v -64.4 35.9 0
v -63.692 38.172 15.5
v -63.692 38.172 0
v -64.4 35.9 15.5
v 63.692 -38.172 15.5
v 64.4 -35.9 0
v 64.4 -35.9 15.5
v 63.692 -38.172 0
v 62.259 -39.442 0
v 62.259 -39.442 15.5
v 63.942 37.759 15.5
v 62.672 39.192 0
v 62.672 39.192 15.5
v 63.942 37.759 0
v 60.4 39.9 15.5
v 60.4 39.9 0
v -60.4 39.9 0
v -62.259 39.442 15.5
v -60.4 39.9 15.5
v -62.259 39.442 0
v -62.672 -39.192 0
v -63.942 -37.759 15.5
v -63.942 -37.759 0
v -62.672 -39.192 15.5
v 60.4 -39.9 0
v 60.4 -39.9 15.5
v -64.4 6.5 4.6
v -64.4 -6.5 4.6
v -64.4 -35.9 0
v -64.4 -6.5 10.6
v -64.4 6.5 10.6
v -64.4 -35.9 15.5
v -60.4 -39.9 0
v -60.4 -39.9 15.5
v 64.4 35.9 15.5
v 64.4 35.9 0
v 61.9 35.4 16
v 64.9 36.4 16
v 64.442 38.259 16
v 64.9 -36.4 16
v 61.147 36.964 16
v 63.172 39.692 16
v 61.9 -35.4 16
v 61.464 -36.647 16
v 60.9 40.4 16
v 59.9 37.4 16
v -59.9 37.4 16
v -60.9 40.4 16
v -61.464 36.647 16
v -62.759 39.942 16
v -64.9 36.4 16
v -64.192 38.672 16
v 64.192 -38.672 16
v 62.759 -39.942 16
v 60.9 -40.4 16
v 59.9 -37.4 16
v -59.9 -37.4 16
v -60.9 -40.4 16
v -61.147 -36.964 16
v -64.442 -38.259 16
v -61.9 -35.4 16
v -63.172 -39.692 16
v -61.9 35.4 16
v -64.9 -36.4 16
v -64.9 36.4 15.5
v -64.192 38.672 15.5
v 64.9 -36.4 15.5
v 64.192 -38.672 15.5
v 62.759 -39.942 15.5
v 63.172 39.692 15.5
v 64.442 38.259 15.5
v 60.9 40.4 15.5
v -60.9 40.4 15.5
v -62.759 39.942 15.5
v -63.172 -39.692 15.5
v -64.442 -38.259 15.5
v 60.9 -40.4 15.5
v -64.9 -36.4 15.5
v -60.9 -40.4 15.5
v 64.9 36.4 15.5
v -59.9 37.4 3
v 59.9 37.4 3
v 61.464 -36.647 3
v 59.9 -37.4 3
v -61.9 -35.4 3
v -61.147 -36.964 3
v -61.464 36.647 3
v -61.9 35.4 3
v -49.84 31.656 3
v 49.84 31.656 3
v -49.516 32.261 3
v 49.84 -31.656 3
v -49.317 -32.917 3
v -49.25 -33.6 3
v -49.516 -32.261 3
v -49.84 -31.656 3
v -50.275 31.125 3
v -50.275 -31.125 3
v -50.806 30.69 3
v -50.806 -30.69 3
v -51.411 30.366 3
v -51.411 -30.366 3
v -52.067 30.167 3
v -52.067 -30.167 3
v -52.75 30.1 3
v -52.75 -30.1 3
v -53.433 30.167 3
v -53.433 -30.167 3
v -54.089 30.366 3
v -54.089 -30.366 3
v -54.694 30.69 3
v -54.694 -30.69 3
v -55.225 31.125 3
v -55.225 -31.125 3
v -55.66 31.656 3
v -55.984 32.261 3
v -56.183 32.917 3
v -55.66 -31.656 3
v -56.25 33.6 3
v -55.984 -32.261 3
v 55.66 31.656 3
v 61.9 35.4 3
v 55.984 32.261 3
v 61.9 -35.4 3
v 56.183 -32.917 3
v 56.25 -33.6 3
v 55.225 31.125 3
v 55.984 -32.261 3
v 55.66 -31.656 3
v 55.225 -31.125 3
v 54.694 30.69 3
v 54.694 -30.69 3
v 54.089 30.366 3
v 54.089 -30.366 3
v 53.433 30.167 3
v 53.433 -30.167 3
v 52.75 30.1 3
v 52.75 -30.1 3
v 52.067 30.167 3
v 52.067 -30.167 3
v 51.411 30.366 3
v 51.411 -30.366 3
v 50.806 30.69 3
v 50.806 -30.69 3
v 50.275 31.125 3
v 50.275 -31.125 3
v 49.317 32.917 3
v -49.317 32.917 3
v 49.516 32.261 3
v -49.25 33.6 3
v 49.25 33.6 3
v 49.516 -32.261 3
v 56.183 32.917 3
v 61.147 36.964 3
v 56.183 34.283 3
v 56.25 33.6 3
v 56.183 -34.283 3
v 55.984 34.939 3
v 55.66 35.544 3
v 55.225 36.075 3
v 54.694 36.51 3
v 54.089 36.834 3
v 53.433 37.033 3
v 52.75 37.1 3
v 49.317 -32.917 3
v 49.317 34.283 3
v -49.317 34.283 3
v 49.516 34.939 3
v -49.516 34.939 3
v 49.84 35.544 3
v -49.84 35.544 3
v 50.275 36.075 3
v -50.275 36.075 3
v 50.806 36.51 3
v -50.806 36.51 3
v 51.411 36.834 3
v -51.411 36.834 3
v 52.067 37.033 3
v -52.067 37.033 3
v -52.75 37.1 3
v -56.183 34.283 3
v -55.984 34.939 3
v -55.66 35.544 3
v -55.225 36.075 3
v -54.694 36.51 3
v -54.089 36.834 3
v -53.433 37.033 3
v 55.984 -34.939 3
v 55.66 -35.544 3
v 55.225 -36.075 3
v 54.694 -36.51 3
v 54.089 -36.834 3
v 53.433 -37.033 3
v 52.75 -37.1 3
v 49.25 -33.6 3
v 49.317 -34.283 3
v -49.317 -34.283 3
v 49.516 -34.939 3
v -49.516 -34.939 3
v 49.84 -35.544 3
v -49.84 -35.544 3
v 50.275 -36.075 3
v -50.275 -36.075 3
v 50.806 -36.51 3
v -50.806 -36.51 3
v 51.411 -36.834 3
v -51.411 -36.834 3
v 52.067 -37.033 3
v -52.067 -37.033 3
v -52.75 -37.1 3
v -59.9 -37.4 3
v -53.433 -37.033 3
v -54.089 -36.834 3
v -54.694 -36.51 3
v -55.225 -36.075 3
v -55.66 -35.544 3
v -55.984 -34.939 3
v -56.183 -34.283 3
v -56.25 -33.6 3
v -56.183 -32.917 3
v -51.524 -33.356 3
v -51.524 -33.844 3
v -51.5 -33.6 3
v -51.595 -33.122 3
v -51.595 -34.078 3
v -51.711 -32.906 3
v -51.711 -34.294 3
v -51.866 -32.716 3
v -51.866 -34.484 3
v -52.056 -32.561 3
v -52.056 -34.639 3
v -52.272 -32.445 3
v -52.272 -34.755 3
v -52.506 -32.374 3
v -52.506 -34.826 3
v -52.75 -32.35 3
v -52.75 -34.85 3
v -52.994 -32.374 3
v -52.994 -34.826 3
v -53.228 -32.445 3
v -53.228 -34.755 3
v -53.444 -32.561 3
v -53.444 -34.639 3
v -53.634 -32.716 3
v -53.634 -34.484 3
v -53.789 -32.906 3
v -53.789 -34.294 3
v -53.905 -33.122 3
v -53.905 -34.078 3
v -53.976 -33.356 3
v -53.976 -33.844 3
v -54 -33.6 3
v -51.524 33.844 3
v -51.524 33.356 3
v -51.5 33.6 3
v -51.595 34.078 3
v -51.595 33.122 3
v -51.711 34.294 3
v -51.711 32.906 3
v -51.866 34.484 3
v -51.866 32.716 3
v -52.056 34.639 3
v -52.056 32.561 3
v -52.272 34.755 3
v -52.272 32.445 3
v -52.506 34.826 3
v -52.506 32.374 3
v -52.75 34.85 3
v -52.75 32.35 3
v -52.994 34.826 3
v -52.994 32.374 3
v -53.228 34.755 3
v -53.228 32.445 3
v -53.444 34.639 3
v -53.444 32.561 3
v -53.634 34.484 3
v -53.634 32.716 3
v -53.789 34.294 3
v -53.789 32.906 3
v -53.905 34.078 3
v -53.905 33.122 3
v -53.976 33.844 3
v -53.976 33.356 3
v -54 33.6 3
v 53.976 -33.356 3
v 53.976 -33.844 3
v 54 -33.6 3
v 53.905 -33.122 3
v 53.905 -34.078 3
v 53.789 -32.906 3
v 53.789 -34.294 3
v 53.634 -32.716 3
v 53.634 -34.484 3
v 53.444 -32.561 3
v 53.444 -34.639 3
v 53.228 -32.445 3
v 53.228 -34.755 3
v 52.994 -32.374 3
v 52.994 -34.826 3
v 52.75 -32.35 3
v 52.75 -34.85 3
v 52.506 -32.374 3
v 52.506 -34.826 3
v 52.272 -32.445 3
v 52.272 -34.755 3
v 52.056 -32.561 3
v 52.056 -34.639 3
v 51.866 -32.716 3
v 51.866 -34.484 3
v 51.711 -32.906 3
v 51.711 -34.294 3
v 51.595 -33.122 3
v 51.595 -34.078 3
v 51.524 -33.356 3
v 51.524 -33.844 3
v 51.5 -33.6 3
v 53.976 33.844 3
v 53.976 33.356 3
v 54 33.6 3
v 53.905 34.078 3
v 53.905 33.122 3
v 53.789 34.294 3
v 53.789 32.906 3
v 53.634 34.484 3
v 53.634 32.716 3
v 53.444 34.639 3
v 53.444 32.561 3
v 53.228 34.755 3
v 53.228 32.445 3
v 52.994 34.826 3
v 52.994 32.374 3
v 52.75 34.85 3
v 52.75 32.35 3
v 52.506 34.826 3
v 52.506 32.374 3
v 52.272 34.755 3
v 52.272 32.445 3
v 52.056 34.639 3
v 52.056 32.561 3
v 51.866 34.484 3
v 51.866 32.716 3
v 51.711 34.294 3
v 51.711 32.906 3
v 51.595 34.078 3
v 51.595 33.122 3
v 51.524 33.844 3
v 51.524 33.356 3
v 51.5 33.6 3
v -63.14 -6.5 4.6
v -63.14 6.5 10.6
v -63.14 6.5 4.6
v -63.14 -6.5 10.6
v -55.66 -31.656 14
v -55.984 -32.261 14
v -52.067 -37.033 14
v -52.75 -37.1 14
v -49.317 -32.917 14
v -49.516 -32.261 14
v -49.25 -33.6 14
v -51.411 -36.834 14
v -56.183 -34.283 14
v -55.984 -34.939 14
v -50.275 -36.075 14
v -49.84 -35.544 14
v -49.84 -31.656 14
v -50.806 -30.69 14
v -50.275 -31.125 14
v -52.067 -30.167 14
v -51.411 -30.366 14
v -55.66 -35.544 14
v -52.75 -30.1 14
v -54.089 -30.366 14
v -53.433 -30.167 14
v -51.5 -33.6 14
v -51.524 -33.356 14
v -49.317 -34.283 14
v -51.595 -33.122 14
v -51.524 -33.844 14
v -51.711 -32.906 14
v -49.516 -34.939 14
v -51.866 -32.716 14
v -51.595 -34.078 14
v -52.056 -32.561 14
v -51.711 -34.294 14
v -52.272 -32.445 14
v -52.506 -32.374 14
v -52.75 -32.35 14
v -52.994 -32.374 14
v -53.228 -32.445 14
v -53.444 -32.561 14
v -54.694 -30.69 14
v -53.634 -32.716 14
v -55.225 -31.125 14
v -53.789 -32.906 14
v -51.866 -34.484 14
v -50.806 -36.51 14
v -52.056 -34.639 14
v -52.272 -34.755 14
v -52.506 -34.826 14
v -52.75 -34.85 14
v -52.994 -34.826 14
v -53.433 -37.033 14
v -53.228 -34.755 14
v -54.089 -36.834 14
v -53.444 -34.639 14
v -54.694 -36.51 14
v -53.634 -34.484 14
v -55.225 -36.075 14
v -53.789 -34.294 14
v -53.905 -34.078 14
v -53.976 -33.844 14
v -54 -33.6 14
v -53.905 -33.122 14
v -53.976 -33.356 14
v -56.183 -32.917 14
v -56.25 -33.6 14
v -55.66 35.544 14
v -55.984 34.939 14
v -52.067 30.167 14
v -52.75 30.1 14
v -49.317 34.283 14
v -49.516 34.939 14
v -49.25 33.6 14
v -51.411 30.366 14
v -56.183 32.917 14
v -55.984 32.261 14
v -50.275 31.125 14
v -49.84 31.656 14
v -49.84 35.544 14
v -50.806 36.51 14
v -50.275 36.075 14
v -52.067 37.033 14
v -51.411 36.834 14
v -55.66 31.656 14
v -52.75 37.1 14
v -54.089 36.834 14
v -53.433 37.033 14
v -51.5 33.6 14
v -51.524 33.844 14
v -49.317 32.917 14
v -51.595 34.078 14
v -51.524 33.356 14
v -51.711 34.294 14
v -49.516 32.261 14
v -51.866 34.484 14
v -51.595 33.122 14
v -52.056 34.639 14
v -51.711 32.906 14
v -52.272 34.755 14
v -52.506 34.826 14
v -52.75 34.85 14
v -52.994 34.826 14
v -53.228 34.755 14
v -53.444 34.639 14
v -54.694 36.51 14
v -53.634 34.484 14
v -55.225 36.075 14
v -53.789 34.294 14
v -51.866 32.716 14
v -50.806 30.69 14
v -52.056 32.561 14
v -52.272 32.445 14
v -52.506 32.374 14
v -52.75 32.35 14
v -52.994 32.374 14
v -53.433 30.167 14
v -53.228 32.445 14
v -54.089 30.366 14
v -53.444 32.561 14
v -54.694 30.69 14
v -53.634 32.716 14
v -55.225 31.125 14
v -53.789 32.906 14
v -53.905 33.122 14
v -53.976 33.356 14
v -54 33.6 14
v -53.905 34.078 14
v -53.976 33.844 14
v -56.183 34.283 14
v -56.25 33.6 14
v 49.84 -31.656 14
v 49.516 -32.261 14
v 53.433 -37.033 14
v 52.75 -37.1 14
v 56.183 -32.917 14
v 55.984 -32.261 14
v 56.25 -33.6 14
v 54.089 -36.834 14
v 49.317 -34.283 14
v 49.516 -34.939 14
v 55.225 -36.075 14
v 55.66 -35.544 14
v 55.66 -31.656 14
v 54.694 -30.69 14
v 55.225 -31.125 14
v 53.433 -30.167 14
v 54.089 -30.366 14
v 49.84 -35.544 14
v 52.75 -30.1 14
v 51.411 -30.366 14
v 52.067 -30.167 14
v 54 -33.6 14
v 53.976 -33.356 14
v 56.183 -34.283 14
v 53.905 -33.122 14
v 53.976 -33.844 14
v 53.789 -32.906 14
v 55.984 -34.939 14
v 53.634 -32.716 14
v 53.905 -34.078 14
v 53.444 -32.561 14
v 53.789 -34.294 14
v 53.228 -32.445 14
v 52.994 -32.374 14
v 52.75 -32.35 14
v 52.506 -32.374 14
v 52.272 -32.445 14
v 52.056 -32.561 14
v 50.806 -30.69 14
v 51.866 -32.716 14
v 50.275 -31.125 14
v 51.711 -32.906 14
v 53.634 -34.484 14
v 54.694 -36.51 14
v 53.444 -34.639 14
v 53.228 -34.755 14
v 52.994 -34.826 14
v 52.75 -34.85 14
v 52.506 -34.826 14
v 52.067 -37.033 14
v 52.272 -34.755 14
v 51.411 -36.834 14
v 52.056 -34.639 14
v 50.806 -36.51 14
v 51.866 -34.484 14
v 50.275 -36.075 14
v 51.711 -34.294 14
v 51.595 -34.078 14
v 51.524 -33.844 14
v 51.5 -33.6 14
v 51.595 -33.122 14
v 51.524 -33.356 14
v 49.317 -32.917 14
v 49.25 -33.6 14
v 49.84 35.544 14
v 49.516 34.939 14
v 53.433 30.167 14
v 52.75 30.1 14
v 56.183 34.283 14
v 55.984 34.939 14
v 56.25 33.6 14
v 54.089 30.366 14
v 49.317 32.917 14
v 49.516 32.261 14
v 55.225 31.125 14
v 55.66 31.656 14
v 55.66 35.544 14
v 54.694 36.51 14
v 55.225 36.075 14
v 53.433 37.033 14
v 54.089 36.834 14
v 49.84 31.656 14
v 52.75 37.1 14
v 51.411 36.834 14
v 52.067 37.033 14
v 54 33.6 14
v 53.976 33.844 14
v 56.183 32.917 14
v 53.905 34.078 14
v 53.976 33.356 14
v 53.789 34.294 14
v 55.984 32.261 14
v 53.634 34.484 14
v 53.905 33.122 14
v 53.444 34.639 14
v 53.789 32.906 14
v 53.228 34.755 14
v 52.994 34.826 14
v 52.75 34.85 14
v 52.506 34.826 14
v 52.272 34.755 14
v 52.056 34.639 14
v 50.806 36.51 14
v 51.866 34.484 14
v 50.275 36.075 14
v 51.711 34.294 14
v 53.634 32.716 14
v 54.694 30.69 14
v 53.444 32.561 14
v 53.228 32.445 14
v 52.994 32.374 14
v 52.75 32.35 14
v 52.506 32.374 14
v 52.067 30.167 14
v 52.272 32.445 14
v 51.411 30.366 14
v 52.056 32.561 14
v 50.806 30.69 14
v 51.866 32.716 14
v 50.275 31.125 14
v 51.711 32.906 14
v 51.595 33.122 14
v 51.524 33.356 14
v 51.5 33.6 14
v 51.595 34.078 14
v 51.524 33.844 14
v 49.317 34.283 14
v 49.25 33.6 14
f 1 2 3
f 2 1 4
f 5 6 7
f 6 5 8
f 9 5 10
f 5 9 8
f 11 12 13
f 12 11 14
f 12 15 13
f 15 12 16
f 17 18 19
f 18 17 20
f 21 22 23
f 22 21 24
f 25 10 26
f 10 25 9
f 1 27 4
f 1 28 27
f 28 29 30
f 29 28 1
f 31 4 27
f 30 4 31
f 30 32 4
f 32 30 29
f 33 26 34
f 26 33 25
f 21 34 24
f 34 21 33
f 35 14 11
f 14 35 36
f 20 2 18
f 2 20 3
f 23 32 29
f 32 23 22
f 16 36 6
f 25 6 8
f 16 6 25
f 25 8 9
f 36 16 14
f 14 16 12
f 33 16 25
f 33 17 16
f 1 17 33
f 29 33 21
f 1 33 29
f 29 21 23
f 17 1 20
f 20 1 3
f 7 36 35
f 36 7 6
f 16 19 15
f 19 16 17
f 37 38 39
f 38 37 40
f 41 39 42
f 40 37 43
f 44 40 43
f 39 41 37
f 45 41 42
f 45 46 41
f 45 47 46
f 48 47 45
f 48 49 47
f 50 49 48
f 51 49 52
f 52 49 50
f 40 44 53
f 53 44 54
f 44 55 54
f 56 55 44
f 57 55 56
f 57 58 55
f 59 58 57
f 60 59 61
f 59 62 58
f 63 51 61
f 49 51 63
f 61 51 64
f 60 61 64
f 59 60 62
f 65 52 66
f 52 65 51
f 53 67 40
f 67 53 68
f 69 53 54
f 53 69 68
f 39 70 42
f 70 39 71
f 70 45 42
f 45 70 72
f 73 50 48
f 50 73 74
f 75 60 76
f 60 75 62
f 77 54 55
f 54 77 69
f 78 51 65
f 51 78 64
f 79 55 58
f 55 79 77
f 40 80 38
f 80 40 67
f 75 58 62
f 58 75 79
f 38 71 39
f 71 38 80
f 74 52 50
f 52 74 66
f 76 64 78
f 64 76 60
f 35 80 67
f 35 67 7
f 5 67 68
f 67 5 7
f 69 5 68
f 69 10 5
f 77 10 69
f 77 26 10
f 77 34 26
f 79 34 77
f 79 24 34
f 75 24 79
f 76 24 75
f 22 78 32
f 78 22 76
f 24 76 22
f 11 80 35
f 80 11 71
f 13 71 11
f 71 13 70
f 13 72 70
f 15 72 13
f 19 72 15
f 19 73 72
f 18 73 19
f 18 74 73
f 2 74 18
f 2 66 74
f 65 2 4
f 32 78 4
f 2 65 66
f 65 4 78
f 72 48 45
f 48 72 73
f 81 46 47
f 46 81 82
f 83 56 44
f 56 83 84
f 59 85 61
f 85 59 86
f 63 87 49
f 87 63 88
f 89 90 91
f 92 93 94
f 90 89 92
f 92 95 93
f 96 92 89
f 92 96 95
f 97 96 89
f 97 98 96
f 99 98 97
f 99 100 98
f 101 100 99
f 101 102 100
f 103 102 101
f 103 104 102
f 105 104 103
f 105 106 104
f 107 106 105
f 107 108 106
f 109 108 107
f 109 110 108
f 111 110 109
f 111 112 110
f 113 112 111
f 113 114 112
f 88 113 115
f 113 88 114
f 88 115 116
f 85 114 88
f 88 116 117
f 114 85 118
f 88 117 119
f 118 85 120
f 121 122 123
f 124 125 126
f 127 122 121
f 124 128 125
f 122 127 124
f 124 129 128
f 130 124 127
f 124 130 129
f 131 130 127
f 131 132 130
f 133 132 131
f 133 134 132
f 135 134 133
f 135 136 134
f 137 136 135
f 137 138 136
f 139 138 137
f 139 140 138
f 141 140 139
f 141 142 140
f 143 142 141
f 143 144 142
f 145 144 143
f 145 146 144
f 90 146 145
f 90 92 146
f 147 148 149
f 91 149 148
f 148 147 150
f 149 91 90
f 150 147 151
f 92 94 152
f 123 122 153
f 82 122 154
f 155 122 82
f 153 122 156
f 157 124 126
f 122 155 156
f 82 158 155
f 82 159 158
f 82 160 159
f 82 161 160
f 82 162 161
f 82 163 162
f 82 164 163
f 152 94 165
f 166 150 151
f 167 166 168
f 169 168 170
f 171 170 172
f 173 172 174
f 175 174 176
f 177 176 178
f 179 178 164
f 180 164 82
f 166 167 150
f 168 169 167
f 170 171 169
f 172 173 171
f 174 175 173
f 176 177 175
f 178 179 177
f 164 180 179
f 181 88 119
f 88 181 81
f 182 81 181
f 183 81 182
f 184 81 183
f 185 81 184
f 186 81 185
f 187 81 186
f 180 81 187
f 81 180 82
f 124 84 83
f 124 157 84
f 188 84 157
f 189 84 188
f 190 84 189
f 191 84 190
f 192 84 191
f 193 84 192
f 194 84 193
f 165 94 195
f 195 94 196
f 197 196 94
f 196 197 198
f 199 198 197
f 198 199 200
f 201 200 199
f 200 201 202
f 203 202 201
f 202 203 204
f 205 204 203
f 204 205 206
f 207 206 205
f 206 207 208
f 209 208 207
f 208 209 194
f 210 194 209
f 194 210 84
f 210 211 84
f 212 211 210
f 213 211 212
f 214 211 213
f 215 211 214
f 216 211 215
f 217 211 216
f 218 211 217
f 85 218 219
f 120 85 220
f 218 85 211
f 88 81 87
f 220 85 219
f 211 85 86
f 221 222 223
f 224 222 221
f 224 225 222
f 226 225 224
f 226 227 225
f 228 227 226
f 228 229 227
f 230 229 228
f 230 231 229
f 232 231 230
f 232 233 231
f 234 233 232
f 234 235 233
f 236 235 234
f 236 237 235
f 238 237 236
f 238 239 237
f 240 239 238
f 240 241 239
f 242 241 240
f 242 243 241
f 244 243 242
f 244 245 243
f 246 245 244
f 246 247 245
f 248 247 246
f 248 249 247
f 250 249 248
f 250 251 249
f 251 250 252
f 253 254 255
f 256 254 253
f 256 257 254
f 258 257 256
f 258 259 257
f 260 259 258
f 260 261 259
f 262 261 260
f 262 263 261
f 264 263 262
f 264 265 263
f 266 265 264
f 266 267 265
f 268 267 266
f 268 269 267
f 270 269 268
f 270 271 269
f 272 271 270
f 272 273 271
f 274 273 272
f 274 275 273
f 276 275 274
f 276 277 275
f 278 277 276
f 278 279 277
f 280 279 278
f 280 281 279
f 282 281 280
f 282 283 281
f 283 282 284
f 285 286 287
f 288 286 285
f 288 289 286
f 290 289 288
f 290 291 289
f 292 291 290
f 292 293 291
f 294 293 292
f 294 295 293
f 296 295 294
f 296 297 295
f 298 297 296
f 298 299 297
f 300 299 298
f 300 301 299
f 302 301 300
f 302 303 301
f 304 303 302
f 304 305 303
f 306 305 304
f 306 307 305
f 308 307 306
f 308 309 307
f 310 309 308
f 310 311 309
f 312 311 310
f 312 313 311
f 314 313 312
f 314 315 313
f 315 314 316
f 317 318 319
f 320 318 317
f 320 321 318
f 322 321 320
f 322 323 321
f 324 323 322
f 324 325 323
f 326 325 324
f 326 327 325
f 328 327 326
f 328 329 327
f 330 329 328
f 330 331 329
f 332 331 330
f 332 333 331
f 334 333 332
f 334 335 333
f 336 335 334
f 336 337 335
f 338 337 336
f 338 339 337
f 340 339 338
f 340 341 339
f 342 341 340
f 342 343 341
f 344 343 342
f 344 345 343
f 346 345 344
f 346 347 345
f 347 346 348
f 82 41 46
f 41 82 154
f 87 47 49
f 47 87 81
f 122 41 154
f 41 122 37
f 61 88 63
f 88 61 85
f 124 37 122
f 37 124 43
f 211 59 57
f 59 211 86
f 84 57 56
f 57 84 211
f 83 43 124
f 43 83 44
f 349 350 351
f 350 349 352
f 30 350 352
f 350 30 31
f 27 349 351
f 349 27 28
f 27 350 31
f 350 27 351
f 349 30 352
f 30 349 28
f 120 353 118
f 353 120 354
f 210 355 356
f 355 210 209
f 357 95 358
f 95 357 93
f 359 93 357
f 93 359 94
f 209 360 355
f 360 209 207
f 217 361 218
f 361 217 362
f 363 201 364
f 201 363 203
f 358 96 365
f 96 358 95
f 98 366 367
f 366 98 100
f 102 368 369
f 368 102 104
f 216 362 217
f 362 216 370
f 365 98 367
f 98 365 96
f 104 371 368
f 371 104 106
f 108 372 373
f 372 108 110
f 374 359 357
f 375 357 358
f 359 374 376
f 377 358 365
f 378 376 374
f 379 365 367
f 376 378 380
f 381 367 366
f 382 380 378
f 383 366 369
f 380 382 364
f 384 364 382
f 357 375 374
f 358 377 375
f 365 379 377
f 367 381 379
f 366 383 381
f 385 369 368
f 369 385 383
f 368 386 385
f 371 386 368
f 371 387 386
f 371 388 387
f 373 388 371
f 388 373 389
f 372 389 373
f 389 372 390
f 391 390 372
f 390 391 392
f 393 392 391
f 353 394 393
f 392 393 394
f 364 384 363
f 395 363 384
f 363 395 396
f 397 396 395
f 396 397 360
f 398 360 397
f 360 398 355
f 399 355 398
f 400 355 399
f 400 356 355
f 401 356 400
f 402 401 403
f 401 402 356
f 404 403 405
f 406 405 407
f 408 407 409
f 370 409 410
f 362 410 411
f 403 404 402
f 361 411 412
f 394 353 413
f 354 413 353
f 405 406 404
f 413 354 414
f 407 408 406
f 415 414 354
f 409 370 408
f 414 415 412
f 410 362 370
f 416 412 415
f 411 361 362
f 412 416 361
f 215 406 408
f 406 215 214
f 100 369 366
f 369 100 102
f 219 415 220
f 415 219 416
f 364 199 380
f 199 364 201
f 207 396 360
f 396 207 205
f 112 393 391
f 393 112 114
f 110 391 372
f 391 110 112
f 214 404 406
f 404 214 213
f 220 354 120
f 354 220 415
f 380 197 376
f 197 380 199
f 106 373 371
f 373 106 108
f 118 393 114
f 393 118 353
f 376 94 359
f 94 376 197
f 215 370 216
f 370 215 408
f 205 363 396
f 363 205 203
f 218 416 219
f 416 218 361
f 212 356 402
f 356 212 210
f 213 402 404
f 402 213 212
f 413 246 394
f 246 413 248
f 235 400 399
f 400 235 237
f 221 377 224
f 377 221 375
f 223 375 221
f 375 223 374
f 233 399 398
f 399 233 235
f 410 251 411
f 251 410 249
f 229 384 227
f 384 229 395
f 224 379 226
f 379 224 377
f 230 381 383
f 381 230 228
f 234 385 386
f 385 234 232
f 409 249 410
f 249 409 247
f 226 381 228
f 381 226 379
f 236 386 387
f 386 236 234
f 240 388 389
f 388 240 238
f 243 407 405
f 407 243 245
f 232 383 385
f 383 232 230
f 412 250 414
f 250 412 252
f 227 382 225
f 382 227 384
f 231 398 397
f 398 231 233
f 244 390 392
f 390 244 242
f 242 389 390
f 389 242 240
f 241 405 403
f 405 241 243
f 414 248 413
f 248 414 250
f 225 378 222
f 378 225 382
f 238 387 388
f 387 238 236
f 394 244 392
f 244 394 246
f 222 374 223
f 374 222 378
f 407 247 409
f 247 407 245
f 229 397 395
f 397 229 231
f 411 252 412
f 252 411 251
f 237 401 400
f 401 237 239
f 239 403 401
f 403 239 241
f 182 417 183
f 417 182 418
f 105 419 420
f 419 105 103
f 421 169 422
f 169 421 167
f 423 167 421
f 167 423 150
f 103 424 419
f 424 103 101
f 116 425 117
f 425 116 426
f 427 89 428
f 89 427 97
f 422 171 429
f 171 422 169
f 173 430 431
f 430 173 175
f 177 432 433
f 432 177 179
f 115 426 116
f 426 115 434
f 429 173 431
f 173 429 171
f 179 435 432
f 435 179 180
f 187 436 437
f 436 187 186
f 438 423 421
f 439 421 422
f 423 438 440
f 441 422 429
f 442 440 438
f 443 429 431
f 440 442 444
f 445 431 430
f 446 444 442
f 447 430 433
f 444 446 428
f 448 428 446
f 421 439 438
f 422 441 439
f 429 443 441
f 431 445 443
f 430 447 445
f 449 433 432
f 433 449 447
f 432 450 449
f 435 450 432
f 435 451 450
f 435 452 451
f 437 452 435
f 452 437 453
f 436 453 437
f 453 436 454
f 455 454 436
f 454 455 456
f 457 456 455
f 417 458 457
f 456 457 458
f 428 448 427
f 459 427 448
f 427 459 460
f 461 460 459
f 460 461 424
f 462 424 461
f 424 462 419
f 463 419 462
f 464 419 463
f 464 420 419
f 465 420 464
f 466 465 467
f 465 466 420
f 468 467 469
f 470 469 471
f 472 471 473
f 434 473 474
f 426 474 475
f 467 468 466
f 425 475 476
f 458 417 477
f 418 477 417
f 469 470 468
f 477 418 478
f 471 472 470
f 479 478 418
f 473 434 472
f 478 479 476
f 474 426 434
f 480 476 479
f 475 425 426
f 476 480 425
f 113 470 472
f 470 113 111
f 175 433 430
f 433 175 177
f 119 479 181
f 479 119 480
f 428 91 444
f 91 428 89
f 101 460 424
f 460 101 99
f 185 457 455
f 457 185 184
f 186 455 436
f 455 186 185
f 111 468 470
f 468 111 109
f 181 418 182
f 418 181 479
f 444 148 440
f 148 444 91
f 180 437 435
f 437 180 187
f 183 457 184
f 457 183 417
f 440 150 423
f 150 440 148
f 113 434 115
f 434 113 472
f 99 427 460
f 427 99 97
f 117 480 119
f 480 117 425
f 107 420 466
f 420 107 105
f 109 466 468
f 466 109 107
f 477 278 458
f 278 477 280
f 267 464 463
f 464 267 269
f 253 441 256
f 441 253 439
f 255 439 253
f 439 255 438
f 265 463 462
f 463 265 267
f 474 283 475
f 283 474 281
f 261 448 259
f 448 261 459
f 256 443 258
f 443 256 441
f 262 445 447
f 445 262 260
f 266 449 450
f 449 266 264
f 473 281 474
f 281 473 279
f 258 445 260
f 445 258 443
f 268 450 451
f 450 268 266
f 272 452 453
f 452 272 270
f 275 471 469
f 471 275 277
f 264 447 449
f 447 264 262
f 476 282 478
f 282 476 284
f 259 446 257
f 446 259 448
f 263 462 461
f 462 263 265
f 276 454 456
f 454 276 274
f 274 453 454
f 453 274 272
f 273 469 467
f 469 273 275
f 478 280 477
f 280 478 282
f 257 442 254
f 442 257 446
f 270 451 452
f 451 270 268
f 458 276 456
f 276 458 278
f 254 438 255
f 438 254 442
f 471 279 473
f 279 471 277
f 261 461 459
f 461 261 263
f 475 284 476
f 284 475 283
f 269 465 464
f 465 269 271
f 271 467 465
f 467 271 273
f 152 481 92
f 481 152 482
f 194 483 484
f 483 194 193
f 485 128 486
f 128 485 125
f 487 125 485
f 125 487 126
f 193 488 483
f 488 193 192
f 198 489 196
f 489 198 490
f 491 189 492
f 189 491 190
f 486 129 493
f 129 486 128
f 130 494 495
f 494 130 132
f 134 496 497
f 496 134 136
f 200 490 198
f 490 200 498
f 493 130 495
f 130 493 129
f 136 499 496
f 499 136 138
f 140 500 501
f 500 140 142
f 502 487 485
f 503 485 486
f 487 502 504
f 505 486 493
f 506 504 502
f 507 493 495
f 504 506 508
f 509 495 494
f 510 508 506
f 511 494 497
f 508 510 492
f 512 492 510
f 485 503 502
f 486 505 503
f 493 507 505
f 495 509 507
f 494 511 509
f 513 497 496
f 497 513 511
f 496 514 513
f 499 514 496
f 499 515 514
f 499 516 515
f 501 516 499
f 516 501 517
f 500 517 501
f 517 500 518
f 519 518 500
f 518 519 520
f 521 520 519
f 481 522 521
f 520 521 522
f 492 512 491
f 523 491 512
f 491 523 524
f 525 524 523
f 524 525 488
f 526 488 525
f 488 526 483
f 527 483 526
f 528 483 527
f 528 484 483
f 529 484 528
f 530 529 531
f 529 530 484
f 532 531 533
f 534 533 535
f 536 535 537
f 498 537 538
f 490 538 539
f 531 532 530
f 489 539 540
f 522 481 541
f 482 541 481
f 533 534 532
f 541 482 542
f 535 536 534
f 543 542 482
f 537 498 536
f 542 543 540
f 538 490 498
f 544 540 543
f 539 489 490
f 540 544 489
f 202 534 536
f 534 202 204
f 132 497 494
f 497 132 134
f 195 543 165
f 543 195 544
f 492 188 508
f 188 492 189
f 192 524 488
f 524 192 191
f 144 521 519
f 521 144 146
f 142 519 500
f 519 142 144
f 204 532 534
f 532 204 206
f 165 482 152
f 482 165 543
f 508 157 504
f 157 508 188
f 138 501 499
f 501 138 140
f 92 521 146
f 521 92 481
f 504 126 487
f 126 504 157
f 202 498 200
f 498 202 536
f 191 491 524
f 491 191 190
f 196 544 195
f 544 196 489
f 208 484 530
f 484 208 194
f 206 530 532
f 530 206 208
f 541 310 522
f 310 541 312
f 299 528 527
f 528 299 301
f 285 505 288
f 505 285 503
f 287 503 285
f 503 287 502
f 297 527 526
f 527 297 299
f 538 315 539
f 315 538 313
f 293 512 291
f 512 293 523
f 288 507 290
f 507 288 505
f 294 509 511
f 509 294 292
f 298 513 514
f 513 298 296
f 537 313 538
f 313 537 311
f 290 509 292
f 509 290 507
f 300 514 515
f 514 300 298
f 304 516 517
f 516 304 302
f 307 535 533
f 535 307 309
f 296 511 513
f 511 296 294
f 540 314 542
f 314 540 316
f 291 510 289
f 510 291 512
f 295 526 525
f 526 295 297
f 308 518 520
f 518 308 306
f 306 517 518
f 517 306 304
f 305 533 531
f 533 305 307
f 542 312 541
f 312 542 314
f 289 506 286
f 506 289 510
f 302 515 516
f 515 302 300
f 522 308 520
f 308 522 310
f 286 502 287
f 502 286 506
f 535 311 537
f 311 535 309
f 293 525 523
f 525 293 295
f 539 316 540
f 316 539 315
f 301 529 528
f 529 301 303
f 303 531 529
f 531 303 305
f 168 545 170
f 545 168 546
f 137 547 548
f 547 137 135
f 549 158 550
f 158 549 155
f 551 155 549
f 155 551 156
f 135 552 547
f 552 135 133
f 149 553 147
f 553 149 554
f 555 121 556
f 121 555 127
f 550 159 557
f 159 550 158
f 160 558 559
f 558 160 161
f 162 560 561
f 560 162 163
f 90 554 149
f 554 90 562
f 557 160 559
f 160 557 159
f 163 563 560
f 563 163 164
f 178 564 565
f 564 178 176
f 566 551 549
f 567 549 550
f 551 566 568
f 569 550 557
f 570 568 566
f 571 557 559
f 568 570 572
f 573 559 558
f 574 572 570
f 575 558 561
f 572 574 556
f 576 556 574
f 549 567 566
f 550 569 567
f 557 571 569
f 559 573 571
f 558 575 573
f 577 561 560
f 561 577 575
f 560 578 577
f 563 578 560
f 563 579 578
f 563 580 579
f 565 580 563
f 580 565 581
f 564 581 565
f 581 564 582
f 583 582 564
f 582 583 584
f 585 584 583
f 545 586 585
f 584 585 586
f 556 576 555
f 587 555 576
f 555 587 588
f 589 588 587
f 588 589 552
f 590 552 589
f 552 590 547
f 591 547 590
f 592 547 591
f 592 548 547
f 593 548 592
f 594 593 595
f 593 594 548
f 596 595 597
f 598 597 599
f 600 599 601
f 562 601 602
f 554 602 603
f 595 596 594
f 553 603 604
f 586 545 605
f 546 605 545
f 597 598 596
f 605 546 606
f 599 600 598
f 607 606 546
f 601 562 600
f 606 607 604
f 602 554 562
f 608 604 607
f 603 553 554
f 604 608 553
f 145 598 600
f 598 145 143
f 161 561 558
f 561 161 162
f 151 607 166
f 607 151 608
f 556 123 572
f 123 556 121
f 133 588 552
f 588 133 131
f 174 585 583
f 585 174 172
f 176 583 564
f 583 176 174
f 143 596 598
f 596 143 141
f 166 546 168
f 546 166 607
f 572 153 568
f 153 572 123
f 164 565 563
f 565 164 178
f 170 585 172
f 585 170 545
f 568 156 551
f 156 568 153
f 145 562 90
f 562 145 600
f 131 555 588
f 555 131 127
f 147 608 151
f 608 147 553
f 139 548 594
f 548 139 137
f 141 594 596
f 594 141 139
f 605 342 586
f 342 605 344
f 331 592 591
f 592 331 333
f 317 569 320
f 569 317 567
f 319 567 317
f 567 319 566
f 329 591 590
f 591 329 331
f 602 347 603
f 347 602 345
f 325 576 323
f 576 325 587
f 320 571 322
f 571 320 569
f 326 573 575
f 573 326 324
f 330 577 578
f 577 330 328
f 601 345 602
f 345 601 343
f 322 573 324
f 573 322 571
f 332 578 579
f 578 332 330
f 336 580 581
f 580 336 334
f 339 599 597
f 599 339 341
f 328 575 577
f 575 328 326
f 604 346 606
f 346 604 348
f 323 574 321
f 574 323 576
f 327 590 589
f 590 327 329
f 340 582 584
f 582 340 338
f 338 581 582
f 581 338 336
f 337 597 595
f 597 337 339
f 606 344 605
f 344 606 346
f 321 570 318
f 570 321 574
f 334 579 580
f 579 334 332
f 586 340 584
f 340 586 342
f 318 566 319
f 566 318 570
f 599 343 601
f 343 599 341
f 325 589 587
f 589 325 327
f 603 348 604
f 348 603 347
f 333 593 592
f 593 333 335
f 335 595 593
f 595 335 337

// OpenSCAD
/*
 * Sunton ESP32-4827S043 Desk Monitor Enclosure
 * --------------------------------------------
 * Parametric three-piece enclosure :
 *  - front case (bezel + PCB pocket + USB cutout)
 *  - back cover (flat, wall-mount keyholes, screw posts)
 *  - desk stand (separate wedge, screws into back cover)
 *
 * PCB reference (from manufacturer datasheet):
 *   - PCB : 123.0 x 74.0 x 1.6 mm
 *   - LCD module : 105.5 x 67.2 mm
 *   - Active area : 95.04 x 53.86 mm
 *   - Mounting holes : 4 x D3.2, entraxe 105.5 x 67.2 mm
 *
 * User-specific constraint :
 *   - USB-C port on the side, vertically centered.
 */

// ---------- Rendering toggle ----------
part = "front";    // [front, back, stand, all]

// ---------- PCB dimensions ----------
pcb_w       = 123.0;
pcb_h       = 74.0;
pcb_t       = 1.6;

// ---------- Screen ----------
mod_w       = 105.5;      // LCD module width
mod_h       = 67.2;       // LCD module height
active_w    = 95.04;
active_h    = 53.86;

// ---------- Mounting holes ----------
hole_dx     = 105.5;
hole_dy     = 67.2;
hole_d      = 3.2;
hole_r      = hole_d / 2;

// ---------- Enclosure parameters ----------
wall        = 2.5;
tol         = 0.4;        // play around PCB
body_d      = 16.0;       // depth of front case
front_t     = 3.0;        // thickness of front bezel

usb_w       = 13.0;       // USB-C cutout width
usb_h       = 6.0;        // USB-C cutout height
usb_side    = "left";     // [left, right]
usb_y       = pcb_h / 2;  // vertically centered

screw_d     = 2.5;        // self-tapping screw
boss_d      = 7.0;
back_t      = 2.5;

// ---------- Desk stand parameters ----------
stand_w     = 90.0;
stand_d     = 45.0;
stand_h_back= 22.0;       // high side
stand_h_front= 5.0;       // low side
stand_angle = atan((stand_h_back - stand_h_front) / stand_d);

// ---------- Computed ----------
body_w      = pcb_w + 2*wall + 2*tol;
body_h      = pcb_h + 2*wall + 2*tol;
pocket_w    = pcb_w + 2*tol;
pocket_h    = pcb_h + 2*tol;
pocket_d    = body_d - front_t;

// ---------- Helpers ----------
module rounded_rect(w, h, r) {
    offset(r = r) offset(delta = -r) square([w, h], center = true);
}

module front_case() {
    difference() {
        union() {
            // Main body
            linear_extrude(height = body_d)
                rounded_rect(body_w, body_h, 4);

            // Front bezel lip
            translate([0, 0, body_d - 0.5])
                linear_extrude(height = 0.5)
                    rounded_rect(body_w + 1, body_h + 1, 4);
        }

        // PCB pocket
        translate([0, 0, front_t])
            linear_extrude(height = pocket_d + 0.02)
                rounded_rect(pocket_w, pocket_h, 2);

        // Screen opening (active area + margin)
        translate([0, 0, body_d - front_t - 0.01])
            linear_extrude(height = front_t + 0.02)
                square([active_w + 1.5, active_h + 1.5], center = true);

        // Touch module clearance
        translate([0, 0, front_t])
            linear_extrude(height = body_d - front_t + 0.01)
                square([mod_w + 0.5, mod_h + 0.5], center = true);

        // USB-C cutout (side, centered vertically)
        usb_x = (usb_side == "left") ? -body_w/2 - 0.01 : body_w/2 + 0.01;
        translate([usb_x, 0, front_t + pcb_t + usb_h/2])
            cube([wall + 0.04, usb_w, usb_h], center = true);
    }

    // Mounting bosses (front half)
    for (dx = [-hole_dx/2, hole_dx/2])
        for (dy = [-hole_dy/2, hole_dy/2])
            translate([dx, dy, front_t])
                difference() {
                    cylinder(h = pocket_d - 2, d = boss_d, $fn = 32);
                    cylinder(h = pocket_d, d = screw_d, $fn = 32);
                }
}

module back_cover() {
    total_w = body_w;
    total_h = body_h;

    difference() {
        union() {
            // Back plate
            linear_extrude(height = back_t)
                rounded_rect(total_w, total_h, 4);

            // Perimeter lip to fit front case
            translate([0, 0, back_t])
                difference() {
                    linear_extrude(height = 3)
                        rounded_rect(total_w - 0.5, total_h - 0.5, 3.5);
                    linear_extrude(height = 3.1)
                        rounded_rect(total_w - 5, total_h - 5, 2);
                }

            // Screw posts (long enough to also screw the stand)
            for (dx = [-hole_dx/2, hole_dx/2])
                for (dy = [-hole_dy/2, hole_dy/2])
                    translate([dx, dy, back_t])
                        difference() {
                            cylinder(h = body_d - front_t - back_t + 2, d = boss_d, $fn = 32);
                            cylinder(h = body_d + 4, d = screw_d, $fn = 32);
                        }
        }

        // Wall-mount keyholes (2x2 grid, on back face)
        for (x = [-30, 30])
            for (y = [-20, 20])
                translate([x, y, -0.01])
                    keyhole();
    }
}

module keyhole() {
    linear_extrude(height = back_t + 0.02) {
        union() {
            circle(d = 8, $fn = 24);
            translate([0, -12, 0])
                square([4, 14], center = true);
        }
    }
}

module desk_stand() {
    // Wedge: print with large face down => no supports
    // Back face angle = stand_angle from horizontal
    difference() {
        // Solid wedge
        rotate([90, 0, 0])
            linear_extrude(height = stand_w, center = true, convexity = 2)
                polygon(points=[
                    [-stand_d/2, 0],
                    [stand_d/2, 0],
                    [stand_d/2, stand_h_front],
                    [-stand_d/2, stand_h_back]
                ]);

        // Screw holes into back cover (use two lower holes)
        // Back cover hole spacing is hole_dx x hole_dy.
        // We place the stand holes at the same spacing, near the bottom.
        for (dx = [-hole_dx/2, hole_dx/2])
            translate([dx, -stand_w/2 + 10, 4])
                rotate([-90, 0, 0])
                    cylinder(h = stand_w - 12, d = screw_d, $fn = 32);
    }
}

// ---------- Render ----------
if (part == "front" || part == "all")
    color("cyan") front_case();

if (part == "back" || part == "all")
    translate([part == "all" ? body_w + 20 : 0, 0, 0])
        color("magenta") back_cover();

if (part == "stand" || part == "all")
    translate([part == "all" ? -body_w - 20 : 0, 0, 0])
        color("yellow") desk_stand();
